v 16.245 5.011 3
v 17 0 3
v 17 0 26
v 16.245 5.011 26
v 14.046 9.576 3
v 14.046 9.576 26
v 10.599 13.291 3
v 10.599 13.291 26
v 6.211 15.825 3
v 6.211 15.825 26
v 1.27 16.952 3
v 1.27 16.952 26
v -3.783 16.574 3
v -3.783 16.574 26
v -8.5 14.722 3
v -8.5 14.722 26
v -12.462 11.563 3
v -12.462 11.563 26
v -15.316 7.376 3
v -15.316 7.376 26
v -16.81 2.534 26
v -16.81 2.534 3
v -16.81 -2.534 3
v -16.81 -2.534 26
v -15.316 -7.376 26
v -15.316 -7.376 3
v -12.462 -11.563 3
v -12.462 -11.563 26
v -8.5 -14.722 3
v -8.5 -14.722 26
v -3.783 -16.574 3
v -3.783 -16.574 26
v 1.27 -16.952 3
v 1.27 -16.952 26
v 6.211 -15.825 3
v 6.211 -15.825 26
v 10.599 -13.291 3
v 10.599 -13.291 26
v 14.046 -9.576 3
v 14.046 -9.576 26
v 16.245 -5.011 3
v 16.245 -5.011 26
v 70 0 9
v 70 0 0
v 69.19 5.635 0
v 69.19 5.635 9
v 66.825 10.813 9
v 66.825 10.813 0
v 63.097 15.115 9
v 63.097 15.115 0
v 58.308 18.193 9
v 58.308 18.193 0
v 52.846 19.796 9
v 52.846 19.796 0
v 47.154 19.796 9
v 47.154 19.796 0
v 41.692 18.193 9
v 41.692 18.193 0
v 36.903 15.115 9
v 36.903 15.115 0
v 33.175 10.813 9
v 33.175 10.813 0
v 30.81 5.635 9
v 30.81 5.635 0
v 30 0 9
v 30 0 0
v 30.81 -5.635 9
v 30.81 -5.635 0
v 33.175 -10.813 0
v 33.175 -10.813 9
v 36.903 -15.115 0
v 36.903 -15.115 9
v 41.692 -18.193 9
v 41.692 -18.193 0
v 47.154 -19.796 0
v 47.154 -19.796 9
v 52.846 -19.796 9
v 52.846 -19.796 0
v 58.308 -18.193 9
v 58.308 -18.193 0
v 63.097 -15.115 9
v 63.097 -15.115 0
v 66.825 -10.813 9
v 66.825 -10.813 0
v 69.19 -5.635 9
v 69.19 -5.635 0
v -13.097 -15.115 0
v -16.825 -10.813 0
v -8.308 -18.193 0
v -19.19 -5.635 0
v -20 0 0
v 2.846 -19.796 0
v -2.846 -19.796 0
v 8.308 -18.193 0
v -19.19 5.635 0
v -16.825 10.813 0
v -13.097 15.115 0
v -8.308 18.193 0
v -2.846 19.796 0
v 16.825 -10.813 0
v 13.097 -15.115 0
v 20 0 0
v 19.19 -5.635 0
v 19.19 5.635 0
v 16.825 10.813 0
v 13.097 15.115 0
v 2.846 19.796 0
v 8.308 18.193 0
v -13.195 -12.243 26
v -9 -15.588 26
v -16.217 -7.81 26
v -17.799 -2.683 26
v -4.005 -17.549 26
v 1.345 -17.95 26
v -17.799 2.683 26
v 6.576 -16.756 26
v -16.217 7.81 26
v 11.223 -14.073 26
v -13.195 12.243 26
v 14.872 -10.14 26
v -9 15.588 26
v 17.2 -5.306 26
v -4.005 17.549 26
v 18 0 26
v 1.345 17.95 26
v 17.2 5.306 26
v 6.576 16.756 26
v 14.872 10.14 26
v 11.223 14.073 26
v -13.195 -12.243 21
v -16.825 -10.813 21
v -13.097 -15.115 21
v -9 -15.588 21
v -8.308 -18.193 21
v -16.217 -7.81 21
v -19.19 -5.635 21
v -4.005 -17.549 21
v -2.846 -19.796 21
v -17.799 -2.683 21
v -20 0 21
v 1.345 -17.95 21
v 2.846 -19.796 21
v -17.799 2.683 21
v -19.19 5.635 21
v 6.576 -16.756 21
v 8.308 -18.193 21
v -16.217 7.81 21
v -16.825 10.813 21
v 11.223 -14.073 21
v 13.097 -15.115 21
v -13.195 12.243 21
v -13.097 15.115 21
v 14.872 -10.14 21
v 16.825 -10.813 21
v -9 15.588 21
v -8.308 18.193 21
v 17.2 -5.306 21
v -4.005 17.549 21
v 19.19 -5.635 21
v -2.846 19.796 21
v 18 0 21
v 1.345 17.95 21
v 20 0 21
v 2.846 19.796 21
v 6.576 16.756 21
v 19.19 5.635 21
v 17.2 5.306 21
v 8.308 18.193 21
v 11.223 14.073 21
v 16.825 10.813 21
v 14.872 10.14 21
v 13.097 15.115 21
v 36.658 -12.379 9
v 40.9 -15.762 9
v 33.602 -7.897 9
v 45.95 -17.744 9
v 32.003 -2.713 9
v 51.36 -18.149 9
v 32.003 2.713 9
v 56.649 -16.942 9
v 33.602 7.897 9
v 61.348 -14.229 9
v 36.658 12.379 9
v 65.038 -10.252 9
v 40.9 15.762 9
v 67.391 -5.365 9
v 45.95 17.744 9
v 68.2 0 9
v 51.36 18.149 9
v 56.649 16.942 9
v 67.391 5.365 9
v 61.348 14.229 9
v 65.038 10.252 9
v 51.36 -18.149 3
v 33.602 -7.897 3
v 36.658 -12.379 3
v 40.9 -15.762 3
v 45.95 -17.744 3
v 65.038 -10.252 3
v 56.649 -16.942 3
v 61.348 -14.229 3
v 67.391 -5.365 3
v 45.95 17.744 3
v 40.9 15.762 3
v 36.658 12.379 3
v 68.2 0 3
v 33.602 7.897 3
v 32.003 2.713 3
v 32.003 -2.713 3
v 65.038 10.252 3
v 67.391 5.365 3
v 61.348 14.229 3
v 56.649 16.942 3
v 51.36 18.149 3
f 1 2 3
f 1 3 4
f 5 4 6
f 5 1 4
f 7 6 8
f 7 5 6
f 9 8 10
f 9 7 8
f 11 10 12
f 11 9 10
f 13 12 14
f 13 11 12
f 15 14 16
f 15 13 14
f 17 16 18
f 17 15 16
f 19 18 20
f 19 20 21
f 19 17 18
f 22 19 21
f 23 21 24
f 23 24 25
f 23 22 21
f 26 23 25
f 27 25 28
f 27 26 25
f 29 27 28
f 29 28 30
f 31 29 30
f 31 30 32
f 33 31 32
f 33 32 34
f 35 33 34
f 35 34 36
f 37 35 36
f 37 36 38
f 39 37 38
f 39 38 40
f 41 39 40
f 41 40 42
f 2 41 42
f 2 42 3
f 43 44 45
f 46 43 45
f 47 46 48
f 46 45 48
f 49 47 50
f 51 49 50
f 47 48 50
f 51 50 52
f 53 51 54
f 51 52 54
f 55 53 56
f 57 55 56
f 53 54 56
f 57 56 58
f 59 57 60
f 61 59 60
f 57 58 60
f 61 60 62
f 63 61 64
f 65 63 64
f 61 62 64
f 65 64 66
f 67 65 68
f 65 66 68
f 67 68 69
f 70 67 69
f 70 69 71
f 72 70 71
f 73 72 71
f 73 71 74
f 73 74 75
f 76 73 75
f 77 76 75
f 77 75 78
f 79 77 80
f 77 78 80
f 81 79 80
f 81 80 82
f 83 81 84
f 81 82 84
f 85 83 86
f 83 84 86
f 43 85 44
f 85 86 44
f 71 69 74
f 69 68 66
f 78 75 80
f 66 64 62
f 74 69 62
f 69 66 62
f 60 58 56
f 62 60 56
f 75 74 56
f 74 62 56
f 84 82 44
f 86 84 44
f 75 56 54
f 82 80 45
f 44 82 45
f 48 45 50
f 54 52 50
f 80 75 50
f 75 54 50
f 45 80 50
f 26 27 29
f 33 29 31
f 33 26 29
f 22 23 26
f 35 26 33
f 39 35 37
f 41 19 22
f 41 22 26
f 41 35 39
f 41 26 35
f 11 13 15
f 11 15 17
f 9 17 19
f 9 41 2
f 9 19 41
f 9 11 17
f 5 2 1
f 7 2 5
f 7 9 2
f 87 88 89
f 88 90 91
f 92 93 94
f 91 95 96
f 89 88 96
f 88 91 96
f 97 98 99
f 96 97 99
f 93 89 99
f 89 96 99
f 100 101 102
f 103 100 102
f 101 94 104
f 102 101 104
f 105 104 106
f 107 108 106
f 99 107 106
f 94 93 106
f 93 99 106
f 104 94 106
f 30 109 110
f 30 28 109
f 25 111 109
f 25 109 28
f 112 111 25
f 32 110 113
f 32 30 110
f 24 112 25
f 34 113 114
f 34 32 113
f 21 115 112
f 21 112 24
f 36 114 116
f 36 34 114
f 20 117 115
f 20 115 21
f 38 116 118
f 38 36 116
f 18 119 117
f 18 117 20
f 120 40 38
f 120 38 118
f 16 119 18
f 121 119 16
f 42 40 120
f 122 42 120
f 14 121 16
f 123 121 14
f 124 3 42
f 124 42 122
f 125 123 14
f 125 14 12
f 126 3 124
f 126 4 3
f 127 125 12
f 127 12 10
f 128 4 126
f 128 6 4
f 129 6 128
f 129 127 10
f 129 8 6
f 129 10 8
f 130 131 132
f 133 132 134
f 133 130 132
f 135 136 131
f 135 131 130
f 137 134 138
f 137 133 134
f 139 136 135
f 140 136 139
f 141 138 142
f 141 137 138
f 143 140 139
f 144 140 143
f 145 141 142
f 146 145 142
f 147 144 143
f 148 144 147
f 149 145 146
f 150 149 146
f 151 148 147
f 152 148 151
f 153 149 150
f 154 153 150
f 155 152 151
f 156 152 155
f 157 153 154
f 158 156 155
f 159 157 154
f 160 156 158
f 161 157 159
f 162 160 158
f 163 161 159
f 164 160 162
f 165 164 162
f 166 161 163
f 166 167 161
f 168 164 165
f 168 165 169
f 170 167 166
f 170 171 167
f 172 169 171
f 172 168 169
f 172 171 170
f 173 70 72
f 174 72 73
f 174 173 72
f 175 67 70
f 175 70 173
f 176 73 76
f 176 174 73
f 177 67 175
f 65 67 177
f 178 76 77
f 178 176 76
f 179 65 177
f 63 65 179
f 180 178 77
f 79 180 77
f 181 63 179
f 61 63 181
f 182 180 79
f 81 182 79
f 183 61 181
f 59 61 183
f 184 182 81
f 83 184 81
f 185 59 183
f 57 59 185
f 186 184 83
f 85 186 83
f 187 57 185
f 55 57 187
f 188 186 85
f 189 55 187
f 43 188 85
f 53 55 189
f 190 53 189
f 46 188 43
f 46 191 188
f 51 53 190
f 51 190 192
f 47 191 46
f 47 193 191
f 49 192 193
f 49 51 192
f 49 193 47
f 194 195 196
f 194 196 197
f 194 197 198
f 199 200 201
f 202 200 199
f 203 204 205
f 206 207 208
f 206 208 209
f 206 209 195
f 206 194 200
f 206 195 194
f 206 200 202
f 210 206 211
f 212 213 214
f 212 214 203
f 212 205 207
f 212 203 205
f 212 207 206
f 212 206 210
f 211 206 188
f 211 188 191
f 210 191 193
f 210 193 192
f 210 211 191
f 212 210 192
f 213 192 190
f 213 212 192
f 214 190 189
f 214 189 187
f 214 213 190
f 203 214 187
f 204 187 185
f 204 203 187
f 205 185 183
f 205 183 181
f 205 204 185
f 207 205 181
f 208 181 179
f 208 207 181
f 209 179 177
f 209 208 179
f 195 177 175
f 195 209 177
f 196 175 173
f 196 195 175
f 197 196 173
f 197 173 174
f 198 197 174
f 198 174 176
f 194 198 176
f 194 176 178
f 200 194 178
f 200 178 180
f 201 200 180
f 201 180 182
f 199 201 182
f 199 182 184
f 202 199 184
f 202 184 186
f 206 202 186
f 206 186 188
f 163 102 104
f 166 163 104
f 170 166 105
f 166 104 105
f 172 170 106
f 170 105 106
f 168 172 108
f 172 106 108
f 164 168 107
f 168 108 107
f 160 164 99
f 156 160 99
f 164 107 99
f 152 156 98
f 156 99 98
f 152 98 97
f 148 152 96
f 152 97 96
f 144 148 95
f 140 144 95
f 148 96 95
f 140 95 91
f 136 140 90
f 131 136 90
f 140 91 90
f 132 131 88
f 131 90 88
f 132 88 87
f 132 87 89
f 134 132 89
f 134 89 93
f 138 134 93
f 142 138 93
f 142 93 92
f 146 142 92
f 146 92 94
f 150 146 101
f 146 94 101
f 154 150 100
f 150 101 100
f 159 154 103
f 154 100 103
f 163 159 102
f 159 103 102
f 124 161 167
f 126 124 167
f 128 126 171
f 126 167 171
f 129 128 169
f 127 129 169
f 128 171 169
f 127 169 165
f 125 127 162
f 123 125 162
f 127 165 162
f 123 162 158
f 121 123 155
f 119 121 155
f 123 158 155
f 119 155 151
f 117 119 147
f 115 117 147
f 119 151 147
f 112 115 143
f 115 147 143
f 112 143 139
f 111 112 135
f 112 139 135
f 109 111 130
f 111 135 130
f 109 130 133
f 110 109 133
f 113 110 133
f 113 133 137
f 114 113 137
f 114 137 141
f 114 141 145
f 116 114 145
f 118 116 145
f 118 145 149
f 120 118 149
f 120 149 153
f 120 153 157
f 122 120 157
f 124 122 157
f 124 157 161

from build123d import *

# Parameters (mm, degrees)
F3_R     = 17
F4_DEPTH = 3
F3_R_2   = 18
F5_DEPTH = 26
F3_R_3   = 20
F6_DEPTH = 21
F7_R     = 18.2
F8_DEPTH = 3
F7_R_2   = 20
F9_DEPTH = 9


with BuildPart() as f4:
    # F3 (on Top) → F4 (new body)
    with BuildSketch(Plane.XY):
        Circle(F3_R)
    extrude(amount=F4_DEPTH)

    # F3 (on Top) → F5 (join)
    with BuildSketch(Plane.XY):
        Circle(F3_R_2)
        Circle(F3_R, mode=Mode.SUBTRACT)
    extrude(amount=F5_DEPTH)

    # F3 (on Top) → F6 (join)
    with BuildSketch(Plane.XY):
        Circle(F3_R_3)
        Circle(F3_R_2, mode=Mode.SUBTRACT)
    extrude(amount=F6_DEPTH)


with BuildPart() as f8:
    # F7 (on Top) → F8 (new body)
    with BuildSketch(Plane.XY):
        with Locations((50, 0)):
            Circle(F7_R)
    extrude(amount=F8_DEPTH)

    # F7 (on Top) → F9 (join)
    with BuildSketch(Plane.XY):
        with Locations((50, 0)):
            Circle(F7_R_2)
        with Locations((50, 0)):
            Circle(F7_R, mode=Mode.SUBTRACT)
    extrude(amount=F9_DEPTH)


solid = Compound([f4.part, f8.part])
